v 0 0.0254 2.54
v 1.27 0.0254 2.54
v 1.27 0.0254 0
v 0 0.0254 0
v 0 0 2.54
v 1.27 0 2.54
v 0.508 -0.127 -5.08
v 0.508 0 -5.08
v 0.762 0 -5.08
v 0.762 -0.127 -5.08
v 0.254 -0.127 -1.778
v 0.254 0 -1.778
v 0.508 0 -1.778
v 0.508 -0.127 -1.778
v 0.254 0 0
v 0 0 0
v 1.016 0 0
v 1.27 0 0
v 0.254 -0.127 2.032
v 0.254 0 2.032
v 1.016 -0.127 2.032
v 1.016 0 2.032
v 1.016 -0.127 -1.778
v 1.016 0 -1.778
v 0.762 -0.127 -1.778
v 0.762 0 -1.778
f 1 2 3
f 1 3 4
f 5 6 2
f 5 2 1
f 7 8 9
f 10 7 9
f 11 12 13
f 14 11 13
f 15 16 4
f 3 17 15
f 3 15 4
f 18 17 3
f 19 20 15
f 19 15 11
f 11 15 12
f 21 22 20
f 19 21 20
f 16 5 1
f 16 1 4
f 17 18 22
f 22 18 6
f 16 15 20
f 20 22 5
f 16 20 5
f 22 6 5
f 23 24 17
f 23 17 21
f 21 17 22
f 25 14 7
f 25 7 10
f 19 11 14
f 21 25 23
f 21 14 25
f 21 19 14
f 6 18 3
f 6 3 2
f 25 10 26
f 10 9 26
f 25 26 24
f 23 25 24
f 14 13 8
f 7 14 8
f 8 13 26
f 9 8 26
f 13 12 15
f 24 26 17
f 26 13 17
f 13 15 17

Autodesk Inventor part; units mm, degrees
ref_plane "YZ Plane" through (0, 0, 0) normal (1, 0, 0) x (0, 1, 0)
ref_plane "XZ Plane" through (0, 0, 0) normal (0, 1, 0) x (-1, 0, 0)
ref_plane "XY Plane" through (0, 0, 0) normal (0, 0, 1) x (1, 0, 0)
sketch "Sketch1" plane through (0, 0, 0) normal (0, 1, 0) x (-1, 0, 0)
  line L0 (0, 0) -> (-1.27, 0)
  line L1 (-1.27, 0) -> (-1.27, 2.54)
  line L2 (-1.27, 2.54) -> (0, 2.54)
  line L3 (0, 2.54) -> (0, 0)
  dimension "d0" = 1.27
  dimension "d1" = 2.54
extrude "Extrusion1" add sketch "Sketch1" along normal blind 0.0254
sketch "Sketch2" plane through (0, 0, 0) normal (0, -1, 0) x (1, 0, 0)
  line L0 (0, 0) -> (0, 2.54) projected
  line L1 (0.254, 2.032) -> (0.254, -1.778)
  line L2 (0.254, -1.778) -> (0.508, -1.778)
  line L3 (0.508, -1.778) -> (0.508, -5.08)
  line L4 (0.508, -5.08) -> (0.762, -5.08)
  line L5 (0.762, -5.08) -> (0.762, -1.778)
  line L6 (0.762, -1.778) -> (1.016, -1.778)
  line L7 (1.016, -1.778) -> (1.016, 2.032)
  line L8 (1.016, 2.032) -> (0.254, 2.032)
  line L9 (0, 2.54) -> (1.27, 2.54) projected
  point P0 (0.254, 2.032)
  dimension "d4" = 0.762
  dimension "d5" = 3.81
  dimension "d6" = 3.302
  dimension "d7" = 0.254
  dimension "d8" = 0.254
  dimension "d9" = 0.508
extrude "Extrusion2" add sketch "Sketch2" along normal blind 0.127
properties part number "pin" material "Gold"
